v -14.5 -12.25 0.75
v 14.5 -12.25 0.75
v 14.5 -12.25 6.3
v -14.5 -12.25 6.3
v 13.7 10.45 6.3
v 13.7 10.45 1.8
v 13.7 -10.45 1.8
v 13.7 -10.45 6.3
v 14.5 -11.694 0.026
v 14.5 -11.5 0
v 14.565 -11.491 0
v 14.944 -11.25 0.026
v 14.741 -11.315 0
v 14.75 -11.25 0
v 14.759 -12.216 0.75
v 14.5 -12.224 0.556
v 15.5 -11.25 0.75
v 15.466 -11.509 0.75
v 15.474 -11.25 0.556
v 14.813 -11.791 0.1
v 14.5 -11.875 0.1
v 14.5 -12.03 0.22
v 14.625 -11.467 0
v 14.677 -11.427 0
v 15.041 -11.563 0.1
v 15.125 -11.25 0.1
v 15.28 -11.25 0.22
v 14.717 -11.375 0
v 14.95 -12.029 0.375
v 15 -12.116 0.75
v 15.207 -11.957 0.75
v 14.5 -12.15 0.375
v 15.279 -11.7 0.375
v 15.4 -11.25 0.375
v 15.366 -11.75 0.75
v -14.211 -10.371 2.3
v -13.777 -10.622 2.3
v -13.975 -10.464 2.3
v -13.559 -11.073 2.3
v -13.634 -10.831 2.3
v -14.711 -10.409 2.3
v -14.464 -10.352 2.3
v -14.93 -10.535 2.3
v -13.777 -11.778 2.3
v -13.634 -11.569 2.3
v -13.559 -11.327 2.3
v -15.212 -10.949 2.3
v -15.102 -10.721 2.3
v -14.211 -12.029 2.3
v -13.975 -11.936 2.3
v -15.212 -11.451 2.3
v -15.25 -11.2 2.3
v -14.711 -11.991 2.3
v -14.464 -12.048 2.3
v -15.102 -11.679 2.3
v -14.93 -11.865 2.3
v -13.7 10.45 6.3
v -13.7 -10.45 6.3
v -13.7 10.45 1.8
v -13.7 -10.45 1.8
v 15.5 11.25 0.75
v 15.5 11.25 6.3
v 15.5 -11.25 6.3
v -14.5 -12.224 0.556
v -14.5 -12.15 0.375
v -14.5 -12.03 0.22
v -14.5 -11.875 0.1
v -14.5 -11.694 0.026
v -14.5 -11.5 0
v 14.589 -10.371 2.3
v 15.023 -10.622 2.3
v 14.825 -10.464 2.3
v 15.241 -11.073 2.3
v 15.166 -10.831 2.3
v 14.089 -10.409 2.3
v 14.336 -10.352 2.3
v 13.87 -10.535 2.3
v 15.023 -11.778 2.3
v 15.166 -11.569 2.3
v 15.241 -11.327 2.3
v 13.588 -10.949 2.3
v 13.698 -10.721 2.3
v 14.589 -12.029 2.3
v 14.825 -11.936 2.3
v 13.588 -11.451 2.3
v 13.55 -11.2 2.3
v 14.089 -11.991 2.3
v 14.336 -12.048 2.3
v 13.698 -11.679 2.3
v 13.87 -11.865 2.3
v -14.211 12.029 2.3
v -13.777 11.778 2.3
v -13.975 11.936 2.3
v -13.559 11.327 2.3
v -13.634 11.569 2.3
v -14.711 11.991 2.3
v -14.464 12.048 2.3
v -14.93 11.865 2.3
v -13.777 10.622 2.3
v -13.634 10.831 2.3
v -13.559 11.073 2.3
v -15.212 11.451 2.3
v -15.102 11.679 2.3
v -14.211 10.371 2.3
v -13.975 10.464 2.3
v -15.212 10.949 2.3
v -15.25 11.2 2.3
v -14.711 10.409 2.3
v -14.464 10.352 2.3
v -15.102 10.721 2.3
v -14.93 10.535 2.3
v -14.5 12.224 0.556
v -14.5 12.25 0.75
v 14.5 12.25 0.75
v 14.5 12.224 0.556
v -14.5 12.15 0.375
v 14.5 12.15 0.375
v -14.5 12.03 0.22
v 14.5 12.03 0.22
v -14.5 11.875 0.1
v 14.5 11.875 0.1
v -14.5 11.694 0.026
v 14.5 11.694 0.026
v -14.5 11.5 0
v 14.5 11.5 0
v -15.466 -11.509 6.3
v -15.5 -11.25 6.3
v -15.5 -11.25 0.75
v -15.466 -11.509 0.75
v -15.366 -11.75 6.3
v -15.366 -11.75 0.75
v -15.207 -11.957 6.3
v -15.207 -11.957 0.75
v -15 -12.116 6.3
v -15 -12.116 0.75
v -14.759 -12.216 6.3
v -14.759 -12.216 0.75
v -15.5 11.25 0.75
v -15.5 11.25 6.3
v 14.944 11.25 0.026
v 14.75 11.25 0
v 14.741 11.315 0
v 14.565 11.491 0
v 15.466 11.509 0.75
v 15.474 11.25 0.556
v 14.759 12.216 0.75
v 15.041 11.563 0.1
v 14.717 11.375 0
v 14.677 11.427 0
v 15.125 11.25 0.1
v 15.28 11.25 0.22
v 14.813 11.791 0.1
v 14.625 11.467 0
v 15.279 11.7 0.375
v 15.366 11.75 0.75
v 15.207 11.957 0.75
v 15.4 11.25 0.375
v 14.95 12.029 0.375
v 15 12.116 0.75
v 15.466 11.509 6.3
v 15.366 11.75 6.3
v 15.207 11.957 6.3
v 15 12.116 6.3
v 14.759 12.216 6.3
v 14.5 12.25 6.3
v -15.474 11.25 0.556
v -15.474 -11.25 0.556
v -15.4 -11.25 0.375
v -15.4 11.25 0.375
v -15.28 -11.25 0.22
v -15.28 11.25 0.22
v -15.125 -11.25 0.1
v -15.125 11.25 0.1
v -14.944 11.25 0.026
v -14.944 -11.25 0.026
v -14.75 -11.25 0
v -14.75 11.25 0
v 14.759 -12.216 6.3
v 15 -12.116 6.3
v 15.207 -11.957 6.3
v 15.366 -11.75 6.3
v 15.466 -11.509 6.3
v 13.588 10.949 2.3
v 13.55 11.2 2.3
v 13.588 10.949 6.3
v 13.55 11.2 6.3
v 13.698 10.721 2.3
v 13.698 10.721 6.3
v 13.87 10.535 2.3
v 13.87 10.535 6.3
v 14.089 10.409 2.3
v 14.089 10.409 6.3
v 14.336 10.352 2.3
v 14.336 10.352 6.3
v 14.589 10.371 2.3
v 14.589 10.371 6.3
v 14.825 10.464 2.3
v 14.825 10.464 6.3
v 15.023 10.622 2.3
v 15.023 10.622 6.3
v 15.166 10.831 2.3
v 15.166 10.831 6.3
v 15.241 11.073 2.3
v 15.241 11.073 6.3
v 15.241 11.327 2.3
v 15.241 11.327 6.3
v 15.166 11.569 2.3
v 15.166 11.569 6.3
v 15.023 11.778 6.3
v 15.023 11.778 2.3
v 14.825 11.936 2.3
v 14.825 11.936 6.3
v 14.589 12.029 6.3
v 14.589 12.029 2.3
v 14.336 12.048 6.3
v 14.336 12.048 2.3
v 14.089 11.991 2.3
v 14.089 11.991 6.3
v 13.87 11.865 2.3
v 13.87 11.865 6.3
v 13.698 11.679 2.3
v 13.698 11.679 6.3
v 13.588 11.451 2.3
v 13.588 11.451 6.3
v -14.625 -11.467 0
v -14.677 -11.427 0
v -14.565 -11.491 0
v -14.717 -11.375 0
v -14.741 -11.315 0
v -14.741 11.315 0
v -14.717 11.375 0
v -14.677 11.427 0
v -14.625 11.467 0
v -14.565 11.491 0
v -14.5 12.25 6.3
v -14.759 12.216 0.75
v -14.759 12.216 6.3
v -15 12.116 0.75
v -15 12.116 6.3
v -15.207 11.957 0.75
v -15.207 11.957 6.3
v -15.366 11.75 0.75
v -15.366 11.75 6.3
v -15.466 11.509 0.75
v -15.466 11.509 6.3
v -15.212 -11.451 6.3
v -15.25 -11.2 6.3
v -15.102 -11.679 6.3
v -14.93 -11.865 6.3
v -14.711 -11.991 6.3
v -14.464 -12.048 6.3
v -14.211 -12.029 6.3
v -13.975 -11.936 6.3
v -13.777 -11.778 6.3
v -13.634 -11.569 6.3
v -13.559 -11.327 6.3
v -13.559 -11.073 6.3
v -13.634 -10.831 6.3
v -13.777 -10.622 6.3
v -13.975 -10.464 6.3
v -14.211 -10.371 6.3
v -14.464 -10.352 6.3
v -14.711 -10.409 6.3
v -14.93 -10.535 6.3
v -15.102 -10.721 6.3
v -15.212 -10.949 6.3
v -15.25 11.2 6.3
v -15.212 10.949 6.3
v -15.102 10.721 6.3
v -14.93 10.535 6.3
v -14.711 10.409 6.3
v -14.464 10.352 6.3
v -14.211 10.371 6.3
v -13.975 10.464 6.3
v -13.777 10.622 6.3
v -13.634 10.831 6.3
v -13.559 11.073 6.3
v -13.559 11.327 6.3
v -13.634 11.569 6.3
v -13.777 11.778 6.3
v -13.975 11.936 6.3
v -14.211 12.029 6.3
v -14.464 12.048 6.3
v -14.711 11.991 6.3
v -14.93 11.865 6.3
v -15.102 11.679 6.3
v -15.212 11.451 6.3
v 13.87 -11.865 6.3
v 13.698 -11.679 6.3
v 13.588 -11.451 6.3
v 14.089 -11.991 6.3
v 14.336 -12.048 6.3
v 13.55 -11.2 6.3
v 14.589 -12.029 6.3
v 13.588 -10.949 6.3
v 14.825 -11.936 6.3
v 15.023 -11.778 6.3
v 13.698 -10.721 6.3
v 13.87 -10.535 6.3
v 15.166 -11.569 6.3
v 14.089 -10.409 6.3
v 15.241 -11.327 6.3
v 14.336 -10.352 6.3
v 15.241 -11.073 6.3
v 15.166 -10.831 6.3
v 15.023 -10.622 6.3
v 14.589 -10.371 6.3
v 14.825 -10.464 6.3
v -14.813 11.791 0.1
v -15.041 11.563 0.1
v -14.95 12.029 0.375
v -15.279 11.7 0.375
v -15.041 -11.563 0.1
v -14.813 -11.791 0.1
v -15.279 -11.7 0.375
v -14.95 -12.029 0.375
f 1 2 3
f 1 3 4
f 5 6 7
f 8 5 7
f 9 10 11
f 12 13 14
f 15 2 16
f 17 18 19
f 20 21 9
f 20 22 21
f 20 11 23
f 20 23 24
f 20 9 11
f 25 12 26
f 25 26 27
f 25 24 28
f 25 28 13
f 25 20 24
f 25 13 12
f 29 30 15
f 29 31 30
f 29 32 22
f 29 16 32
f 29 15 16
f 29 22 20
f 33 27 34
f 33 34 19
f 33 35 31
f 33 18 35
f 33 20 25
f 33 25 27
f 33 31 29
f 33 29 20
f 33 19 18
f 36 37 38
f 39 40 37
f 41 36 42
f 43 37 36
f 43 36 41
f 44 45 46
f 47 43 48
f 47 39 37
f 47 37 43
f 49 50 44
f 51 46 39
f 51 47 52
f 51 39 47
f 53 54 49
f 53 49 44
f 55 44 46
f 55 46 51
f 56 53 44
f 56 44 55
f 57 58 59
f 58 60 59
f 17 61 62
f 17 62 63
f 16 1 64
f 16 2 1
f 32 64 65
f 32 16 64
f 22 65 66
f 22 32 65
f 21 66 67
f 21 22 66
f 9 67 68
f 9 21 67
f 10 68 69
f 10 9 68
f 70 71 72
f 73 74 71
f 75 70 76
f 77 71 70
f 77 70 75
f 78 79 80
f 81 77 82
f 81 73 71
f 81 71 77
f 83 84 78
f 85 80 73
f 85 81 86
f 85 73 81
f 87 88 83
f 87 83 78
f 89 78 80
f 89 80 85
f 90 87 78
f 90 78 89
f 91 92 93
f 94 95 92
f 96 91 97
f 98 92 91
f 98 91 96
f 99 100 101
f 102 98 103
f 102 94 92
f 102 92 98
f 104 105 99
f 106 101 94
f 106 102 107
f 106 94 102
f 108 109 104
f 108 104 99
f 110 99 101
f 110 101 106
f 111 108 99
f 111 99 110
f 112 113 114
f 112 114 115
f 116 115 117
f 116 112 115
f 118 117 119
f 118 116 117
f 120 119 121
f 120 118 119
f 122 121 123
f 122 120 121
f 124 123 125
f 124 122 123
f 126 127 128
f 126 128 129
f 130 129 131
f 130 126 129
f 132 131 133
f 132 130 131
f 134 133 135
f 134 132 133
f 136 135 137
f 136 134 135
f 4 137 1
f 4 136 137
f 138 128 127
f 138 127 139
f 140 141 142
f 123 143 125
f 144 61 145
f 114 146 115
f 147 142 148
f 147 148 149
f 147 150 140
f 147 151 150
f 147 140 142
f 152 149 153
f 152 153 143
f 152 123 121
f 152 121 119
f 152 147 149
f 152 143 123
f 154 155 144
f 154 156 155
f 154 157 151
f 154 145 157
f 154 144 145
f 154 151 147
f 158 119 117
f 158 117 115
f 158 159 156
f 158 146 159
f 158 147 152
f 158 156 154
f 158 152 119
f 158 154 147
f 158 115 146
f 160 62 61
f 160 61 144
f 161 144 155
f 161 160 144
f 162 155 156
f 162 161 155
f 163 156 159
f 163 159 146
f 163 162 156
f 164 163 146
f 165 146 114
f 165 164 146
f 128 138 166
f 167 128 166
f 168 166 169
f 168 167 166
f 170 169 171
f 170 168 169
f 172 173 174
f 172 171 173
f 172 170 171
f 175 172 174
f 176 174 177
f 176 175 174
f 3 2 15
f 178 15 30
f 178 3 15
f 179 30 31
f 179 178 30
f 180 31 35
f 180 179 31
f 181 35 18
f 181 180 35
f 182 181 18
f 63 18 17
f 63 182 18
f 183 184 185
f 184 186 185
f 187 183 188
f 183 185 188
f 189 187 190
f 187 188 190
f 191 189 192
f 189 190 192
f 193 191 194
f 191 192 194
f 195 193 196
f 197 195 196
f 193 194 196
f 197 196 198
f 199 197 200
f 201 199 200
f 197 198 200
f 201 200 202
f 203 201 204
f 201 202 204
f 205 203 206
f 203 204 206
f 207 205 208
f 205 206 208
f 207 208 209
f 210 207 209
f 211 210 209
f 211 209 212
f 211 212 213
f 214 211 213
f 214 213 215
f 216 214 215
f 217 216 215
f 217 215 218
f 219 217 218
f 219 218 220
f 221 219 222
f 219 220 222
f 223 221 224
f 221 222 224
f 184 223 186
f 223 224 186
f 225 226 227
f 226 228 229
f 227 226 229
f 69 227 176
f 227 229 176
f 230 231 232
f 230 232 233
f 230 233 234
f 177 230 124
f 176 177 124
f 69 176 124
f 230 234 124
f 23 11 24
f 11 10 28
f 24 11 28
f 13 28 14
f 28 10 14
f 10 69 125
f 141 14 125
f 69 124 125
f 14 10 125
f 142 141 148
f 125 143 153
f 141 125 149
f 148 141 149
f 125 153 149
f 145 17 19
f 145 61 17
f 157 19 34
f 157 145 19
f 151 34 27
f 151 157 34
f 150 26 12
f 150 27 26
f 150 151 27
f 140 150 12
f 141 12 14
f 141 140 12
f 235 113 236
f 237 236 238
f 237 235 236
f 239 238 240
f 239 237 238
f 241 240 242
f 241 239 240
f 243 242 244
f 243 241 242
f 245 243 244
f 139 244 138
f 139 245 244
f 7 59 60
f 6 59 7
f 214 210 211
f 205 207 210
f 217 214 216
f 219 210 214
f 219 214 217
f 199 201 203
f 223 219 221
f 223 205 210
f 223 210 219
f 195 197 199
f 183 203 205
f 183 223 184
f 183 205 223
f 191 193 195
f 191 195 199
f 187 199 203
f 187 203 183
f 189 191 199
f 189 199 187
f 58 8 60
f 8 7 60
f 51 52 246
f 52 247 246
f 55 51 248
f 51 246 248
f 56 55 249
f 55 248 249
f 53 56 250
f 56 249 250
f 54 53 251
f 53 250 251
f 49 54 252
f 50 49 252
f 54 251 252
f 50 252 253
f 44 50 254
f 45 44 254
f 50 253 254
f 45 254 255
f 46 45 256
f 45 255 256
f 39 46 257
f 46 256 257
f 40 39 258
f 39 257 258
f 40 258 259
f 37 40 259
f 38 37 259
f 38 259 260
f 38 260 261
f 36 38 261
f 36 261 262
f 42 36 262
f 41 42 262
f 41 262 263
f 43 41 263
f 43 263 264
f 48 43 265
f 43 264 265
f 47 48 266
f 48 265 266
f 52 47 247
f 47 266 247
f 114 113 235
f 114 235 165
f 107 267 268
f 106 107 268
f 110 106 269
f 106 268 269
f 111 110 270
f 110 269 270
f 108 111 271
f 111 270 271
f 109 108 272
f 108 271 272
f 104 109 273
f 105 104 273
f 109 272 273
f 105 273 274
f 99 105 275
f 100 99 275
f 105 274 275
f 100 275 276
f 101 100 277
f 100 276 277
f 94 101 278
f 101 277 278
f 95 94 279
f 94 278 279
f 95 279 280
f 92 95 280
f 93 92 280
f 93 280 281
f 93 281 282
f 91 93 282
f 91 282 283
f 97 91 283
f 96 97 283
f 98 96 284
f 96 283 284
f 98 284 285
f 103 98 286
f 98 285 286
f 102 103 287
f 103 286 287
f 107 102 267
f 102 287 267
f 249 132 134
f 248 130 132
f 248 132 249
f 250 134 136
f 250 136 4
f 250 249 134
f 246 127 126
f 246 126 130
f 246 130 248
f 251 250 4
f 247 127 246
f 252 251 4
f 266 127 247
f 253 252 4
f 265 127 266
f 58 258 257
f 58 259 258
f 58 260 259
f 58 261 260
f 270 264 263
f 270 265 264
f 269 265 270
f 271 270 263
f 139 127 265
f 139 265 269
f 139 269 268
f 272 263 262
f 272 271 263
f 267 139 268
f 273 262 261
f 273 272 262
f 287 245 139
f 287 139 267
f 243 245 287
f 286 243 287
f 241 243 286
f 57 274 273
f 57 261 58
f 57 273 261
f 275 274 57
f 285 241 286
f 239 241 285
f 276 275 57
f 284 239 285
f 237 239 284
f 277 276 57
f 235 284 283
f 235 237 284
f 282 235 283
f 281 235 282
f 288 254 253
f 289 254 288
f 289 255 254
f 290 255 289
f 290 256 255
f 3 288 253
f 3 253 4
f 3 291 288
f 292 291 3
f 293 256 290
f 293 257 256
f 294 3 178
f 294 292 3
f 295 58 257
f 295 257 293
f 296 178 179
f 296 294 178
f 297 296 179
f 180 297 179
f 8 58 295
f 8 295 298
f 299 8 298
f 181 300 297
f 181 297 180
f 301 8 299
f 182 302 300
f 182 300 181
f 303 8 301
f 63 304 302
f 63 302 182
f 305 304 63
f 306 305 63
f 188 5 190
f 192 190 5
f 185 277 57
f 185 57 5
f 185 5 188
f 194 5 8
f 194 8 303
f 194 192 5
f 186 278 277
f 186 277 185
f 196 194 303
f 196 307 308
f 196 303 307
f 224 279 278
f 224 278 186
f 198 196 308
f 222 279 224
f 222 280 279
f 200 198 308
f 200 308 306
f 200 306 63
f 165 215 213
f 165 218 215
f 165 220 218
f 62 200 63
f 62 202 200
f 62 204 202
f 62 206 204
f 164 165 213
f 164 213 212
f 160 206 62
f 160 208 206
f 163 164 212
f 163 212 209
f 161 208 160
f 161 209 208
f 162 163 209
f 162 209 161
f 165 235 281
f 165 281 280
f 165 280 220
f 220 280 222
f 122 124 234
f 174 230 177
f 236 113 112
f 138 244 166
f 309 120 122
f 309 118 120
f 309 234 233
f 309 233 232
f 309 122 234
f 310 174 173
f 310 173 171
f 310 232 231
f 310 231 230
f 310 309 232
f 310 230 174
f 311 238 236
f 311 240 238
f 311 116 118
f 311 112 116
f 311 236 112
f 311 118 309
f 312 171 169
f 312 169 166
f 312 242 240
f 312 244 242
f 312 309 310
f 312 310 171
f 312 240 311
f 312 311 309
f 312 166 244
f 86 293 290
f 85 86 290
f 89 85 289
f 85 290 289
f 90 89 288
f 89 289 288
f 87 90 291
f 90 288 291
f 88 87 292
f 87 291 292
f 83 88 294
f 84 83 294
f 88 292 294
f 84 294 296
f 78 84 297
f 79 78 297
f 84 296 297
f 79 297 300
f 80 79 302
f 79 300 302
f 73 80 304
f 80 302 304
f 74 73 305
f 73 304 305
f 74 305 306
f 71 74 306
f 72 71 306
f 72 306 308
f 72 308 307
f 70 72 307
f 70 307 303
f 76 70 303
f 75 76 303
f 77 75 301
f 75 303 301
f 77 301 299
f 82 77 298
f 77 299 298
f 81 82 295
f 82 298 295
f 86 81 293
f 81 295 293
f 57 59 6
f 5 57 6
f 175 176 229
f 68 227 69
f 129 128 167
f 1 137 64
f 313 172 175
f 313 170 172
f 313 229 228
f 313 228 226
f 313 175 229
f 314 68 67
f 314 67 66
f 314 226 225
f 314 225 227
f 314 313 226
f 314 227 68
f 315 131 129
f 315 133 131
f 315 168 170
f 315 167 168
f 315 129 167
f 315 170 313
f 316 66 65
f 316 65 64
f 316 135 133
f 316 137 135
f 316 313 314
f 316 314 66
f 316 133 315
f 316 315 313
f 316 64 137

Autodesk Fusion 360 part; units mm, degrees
sketch "Sketch1" plane through (0, 0, 0) normal (0, 0, 1) x (1, 0, 0) in component "part 1"
  line L0 (-15.5, 12.25) -> (15.5, 12.25)
  line L1 (15.5, 12.25) -> (15.5, -12.25)
  line L2 (15.5, -12.25) -> (-15.5, -12.25)
  line L3 (-15.5, -12.25) -> (-15.5, 12.25)
  line L4 (-15.5, 12.25) -> (15.5, -12.25) construction
  line L5 (15.5, 12.25) -> (-15.5, -12.25) construction
  dimension "d1" = 31
  dimension "d2" = 24.5
extrude "Extrude1" add sketch "Sketch1" along normal blind 6.3 in component "part 1"
sketch "Sketch2" plane through (0, 0, 6.3) normal (0, 0, 1) x (-1, 0, 0) in component "part 1"
  line L0 (15.5, 12.25) -> (-15.5, 12.25)
  line L1 (-15.5, 12.25) -> (-15.5, -12.25)
  line L2 (-15.5, -12.25) -> (15.5, -12.25)
  line L3 (15.5, -12.25) -> (15.5, 12.25)
shell "Shell1" thickness 1.8 removed faces 1 at (-5.1667, 4.0833, 6.3) in component "part 1"
sketch "Sketch3" plane through (0, 0, 6.3) normal (0, 0, 1) x (-1, 0, 0) in component "part 1"
  circle A0 centre (14.4, -11.2) radius 0.85
  line L0 (0, 0) -> (0, -3.5)
  line L1 (0, 0) -> (3.5, 0)
  circle A1 centre (-14.4, -11.2) radius 0.85
  circle A2 centre (-14.4, 11.2) radius 0.85
  circle A3 centre (14.4, 11.2) radius 0.85
  dimension "d8" = 1.7
  dimension "d9" = 11.2
  dimension "d10" = 14.4
extrude "Extrude2" cut sketch "Sketch3" against normal blind 4 in component "part 1"
fillet "Fillet1" radius 1 1 edges at (15.5, -12.25, 3.15) in component "part 1"
fillet "Fillet1" radius 1 1 edges at (15.5, 12.25, 3.15) in component "part 1"
fillet "Fillet1" radius 1 1 edges at (-15.5, 12.25, 3.15) in component "part 1"
fillet "Fillet1" radius 1 1 edges at (-15.5, -12.25, 3.15) in component "part 1"
fillet "Fillet2" radius 0.75 8 edges at (-15.2071, -11.9571, 0) (-15.5, 0, 0) (-15.2071, 11.9571, 0) (0, 12.25, 0) (15.2071, 11.9571, 0) (15.5, 0, 0) (15.2071, -11.9571, 0) (0, -12.25, 0) in component "part 1"
component "part 1" placed x (1, 0, 0) y (0, 1, 0) z (0, 0, 1) at (0, 0, 0)
